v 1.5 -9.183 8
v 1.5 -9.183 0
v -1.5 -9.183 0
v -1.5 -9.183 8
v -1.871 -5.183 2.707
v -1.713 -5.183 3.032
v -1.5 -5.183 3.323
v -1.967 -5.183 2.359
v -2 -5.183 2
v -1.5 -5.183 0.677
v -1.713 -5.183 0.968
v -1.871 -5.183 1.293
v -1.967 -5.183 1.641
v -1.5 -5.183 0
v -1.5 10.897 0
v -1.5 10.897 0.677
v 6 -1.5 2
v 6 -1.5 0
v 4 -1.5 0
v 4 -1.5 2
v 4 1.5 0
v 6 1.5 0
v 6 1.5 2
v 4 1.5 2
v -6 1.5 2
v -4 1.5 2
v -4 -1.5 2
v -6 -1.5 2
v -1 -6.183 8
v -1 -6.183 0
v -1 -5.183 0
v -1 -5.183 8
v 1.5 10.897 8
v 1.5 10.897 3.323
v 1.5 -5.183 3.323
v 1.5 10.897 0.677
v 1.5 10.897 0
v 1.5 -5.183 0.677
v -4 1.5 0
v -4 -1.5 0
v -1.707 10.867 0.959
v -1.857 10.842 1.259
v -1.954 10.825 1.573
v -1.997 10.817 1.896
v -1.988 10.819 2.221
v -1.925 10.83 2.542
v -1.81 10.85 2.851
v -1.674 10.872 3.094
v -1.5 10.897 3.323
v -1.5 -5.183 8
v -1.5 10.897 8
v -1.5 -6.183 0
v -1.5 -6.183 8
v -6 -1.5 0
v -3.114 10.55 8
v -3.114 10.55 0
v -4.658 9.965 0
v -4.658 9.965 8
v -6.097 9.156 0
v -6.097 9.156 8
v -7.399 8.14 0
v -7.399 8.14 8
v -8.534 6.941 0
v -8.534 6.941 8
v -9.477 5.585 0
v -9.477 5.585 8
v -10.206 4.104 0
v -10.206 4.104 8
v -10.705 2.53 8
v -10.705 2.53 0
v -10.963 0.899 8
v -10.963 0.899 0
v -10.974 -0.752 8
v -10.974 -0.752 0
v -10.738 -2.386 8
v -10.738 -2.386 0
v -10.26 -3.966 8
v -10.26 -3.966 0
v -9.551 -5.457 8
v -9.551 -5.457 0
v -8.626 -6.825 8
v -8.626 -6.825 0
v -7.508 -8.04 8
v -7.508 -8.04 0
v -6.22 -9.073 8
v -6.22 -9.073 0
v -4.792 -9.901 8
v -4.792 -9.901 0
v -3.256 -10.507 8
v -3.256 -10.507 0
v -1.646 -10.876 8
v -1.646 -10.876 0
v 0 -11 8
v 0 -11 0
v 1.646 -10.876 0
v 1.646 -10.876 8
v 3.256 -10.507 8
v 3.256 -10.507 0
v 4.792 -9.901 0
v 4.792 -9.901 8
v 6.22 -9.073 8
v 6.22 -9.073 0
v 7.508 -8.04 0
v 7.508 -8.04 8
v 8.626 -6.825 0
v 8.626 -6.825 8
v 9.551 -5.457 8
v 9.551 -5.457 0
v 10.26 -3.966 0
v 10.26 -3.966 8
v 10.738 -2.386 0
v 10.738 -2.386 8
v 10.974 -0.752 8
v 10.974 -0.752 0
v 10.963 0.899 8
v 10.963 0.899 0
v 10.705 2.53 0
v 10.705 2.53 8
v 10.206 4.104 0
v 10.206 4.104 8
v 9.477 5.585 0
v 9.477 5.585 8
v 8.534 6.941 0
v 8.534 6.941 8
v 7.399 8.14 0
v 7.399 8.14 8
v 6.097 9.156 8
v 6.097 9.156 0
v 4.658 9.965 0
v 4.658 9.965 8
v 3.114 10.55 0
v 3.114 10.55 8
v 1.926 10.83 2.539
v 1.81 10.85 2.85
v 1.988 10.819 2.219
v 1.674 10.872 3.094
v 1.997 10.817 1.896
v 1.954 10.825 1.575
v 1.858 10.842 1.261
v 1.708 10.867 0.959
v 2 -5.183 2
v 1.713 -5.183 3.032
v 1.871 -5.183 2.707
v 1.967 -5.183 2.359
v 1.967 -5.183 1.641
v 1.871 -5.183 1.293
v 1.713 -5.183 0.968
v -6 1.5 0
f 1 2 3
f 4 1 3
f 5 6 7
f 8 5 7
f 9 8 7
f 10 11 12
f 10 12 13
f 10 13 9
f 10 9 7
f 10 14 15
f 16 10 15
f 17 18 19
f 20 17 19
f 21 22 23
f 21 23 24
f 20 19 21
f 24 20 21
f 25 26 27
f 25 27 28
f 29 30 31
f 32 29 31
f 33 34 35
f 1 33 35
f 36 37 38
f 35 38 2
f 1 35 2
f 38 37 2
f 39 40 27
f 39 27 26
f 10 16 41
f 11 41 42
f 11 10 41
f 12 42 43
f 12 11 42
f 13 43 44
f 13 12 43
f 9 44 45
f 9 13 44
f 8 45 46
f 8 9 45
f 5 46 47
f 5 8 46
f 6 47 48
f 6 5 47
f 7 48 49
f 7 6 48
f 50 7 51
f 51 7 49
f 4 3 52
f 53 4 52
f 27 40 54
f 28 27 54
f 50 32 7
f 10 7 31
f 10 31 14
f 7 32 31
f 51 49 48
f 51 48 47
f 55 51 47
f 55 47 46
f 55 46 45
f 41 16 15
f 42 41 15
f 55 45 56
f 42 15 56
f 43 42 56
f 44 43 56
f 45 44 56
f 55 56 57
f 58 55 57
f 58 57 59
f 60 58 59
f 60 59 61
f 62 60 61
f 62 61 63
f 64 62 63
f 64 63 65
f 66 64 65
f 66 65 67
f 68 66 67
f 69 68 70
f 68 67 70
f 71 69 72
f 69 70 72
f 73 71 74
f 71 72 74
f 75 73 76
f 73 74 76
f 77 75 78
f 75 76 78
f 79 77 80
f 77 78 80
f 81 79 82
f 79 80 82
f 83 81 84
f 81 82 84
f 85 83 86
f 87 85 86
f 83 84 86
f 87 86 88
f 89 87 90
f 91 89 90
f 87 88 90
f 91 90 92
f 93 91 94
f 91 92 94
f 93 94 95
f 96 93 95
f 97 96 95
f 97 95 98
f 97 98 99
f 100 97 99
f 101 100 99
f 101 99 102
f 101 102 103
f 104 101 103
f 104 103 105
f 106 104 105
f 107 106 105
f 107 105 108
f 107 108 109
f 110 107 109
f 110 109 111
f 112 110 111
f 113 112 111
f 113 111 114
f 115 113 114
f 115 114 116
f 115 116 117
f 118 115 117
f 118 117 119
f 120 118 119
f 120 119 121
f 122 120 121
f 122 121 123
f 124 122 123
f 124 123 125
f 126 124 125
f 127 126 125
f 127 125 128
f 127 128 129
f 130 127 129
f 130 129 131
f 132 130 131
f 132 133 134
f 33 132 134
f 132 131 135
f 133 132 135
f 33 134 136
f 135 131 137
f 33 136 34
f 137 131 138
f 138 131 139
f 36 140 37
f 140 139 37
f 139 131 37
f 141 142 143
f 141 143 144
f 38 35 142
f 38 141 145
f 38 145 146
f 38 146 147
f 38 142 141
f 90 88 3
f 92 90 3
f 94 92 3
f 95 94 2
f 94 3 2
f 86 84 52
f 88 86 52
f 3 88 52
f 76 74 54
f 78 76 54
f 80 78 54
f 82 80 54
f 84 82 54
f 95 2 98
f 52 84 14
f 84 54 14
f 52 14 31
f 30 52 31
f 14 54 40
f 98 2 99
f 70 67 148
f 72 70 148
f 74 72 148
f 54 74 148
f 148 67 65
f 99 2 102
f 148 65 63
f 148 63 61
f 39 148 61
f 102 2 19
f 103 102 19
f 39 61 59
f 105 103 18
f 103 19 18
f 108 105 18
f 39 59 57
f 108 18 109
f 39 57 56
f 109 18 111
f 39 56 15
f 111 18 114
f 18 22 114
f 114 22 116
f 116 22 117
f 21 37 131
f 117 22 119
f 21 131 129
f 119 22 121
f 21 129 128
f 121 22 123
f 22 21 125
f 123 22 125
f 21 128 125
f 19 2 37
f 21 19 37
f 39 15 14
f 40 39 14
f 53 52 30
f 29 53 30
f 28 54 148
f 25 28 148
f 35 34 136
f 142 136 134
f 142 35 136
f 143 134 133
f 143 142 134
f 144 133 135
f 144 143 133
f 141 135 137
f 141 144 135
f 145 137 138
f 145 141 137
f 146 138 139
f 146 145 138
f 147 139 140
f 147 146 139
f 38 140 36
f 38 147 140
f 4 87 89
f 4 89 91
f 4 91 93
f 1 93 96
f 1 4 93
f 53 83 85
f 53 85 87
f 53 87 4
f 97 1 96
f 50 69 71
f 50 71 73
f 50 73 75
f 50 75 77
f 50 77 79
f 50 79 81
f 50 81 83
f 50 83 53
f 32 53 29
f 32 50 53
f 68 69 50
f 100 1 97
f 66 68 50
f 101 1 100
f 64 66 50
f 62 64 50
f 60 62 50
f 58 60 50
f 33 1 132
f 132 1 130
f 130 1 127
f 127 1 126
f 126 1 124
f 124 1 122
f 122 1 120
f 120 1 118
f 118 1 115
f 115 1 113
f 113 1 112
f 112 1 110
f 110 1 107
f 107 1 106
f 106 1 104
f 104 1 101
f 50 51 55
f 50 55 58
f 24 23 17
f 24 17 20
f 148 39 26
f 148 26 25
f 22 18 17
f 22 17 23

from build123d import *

# Parameters (mm, degrees)
BOSS_EXTRUDE1_DEPTH             = 8
SKETCH8_R                       = 2
PIN_HOLE_DEPTH                  = 5.183346
PIN_HOLE_DIRECTION_2_REACH      = 19.493
PIN_HOLE_DIRECTION_2_END_RADIUS = 11
SKETCH6_W                       = 2
SKETCH6_H                       = 3
CUT_EXTRUDE2_DEPTH              = 2


with BuildPart() as part:
    # Sketch1 → Boss-Extrude1 (new body)
    with BuildSketch(Plane.XY):
        with BuildLine():
            ThreePointArc((-1.5, 10.897247359), (0, -11), (1.5, 10.897247359))
            Line((1.5, 10.897247359), (1.5, -9.183346174))
            Line((1.5, -9.183346174), (-1.5, -9.183346174))
            Line((-1.5, -9.183346174), (-1.5, -6.183346174))
            Line((-1.5, -6.183346174), (-1, -6.183346174))
            Line((-1, -6.183346174), (-1, -5.183346174))
            Line((-1, -5.183346174), (-1.5, -5.183346174))
            Line((-1.5, -5.183346174), (-1.5, 10.897247359))
        make_face()
    extrude(amount=BOSS_EXTRUDE1_DEPTH)

    # Sketch8 → pin hole (cut)
    with BuildSketch(Plane(origin=(0, 0, 0), x_dir=(1, 0, 0), z_dir=(0, 1, 0))):
        with Locations((0, -2)):
            Circle(SKETCH8_R)
    extrude(amount=-PIN_HOLE_DEPTH, mode=Mode.SUBTRACT)

    # pin hole direction 2: up to this cylinder (the profile starts inside it)
    pin_hole_direction_2_end = Plane(origin=(0, 0, 2), z_dir=(0, 0, -1)) * Cylinder(PIN_HOLE_DIRECTION_2_END_RADIUS, 61.986, mode=Mode.PRIVATE)
    # Sketch8 → pin hole direction 2 (cut, up to the surface)
    with BuildSketch(Plane(origin=(0, 0, 0), x_dir=(1, 0, 0), z_dir=(0, 1, 0)), mode=Mode.PRIVATE) as pin_hole_direction_2_sk1:
        with Locations((0, -2)):
            Circle(SKETCH8_R)
    pin_hole_direction_2_tool1 = extrude(pin_hole_direction_2_sk1.sketch, amount=PIN_HOLE_DIRECTION_2_REACH, mode=Mode.PRIVATE) & pin_hole_direction_2_end
    add(pin_hole_direction_2_tool1.solids().sort_by_distance((0, 0, 2))[0], mode=Mode.SUBTRACT)

    # Sketch6 → Cut-Extrude2 (cut)
    with BuildSketch(Plane(origin=(0, 0, 0), x_dir=(-1, 0, 0), z_dir=(0, 0, -1))):
        with Locations((-5, 0)):
            Rectangle(SKETCH6_W, SKETCH6_H)
        with Locations((5, 0)):
            Rectangle(SKETCH6_W, SKETCH6_H)
    extrude(amount=-CUT_EXTRUDE2_DEPTH, mode=Mode.SUBTRACT)


solid = part.part
